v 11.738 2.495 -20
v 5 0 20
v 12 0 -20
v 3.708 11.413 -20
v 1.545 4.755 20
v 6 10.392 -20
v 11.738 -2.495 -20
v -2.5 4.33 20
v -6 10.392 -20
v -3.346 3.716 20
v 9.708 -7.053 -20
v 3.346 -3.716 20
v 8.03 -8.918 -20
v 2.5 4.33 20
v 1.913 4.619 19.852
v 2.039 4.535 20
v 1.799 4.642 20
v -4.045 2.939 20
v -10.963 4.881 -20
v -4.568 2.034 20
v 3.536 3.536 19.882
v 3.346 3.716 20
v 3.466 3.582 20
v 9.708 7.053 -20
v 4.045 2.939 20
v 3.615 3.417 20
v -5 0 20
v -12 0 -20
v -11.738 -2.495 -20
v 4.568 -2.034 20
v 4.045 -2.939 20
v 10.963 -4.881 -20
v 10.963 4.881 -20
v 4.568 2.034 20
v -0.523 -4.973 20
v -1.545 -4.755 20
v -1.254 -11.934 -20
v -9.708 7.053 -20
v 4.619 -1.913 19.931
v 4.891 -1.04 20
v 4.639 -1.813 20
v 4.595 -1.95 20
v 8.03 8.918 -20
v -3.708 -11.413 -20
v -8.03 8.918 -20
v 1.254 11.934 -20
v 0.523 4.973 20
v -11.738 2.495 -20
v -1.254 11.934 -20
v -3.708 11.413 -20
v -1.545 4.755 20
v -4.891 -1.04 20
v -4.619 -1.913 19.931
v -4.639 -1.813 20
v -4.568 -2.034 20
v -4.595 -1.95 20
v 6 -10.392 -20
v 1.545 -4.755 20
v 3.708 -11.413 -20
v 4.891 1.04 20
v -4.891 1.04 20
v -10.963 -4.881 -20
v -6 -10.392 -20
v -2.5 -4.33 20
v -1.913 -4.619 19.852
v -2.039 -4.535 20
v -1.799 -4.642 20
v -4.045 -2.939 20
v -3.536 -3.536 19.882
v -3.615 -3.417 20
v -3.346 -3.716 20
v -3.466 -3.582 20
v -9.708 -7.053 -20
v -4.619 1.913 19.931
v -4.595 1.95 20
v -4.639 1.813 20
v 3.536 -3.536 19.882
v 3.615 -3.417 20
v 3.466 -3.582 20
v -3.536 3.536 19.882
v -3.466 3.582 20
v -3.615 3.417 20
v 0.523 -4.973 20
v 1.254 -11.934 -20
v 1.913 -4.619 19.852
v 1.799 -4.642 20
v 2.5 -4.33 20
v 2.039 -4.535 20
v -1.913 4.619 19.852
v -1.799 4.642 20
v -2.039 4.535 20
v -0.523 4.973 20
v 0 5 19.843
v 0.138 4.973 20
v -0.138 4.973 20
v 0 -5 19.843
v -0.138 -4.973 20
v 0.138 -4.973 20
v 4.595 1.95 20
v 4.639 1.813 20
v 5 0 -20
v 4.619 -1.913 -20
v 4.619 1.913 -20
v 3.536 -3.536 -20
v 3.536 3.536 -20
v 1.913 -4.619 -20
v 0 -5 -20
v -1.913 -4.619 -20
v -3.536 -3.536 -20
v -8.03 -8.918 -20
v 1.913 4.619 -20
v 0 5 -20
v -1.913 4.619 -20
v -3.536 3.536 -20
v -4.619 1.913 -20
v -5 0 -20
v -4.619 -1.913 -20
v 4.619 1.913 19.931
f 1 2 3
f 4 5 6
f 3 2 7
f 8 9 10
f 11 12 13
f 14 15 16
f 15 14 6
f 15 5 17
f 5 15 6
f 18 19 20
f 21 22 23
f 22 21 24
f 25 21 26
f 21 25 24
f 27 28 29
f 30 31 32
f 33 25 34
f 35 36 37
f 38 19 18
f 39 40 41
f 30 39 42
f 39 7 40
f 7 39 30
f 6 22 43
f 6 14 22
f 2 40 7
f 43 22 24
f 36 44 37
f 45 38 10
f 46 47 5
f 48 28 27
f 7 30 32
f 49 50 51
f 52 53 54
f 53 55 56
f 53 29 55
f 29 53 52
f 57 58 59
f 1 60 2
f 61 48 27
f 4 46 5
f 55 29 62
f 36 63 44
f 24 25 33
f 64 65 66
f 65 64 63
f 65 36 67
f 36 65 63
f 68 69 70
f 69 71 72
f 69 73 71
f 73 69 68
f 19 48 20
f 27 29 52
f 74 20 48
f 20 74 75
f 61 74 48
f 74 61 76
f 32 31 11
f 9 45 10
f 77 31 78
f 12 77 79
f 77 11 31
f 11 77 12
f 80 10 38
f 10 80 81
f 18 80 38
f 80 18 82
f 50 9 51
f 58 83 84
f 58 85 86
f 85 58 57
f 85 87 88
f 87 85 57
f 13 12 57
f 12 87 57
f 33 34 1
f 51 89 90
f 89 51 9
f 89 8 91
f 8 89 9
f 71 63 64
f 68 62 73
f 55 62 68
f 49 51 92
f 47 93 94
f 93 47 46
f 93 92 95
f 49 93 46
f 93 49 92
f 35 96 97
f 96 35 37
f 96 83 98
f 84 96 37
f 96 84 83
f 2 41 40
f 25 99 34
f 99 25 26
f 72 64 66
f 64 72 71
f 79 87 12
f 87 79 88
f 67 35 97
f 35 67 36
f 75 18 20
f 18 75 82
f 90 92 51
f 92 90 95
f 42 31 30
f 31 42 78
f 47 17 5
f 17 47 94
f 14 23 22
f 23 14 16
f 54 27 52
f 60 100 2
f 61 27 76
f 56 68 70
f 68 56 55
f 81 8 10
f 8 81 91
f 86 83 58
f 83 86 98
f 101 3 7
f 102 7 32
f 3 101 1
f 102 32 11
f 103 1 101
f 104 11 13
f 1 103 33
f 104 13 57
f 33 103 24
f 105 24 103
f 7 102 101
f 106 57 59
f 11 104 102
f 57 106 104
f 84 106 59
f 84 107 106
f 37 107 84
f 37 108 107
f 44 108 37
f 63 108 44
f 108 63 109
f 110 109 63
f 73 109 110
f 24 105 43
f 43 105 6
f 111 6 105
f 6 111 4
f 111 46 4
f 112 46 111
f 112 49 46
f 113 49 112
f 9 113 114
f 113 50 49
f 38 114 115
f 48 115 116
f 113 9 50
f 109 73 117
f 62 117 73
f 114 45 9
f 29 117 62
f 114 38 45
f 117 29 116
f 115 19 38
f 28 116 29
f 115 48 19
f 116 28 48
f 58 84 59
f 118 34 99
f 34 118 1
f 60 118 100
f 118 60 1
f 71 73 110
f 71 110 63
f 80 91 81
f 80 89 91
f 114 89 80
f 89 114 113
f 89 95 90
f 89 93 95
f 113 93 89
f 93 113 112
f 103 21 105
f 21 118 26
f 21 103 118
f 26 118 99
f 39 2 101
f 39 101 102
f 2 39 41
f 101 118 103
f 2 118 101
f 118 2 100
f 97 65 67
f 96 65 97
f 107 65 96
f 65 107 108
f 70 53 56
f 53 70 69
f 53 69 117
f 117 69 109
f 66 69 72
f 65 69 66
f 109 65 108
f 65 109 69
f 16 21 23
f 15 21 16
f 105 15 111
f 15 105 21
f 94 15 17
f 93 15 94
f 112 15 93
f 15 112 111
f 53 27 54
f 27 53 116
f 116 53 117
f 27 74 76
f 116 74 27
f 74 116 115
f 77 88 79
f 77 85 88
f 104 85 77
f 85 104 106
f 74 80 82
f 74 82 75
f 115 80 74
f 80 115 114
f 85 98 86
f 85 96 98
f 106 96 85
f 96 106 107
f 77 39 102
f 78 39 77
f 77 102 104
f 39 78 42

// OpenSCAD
difference() {
  cylinder(h = 40, r1 = 12, r2 = 5, center = true);
  rotate([0, 0, 90])
    cylinder(45, r = 5, center = true);
}
